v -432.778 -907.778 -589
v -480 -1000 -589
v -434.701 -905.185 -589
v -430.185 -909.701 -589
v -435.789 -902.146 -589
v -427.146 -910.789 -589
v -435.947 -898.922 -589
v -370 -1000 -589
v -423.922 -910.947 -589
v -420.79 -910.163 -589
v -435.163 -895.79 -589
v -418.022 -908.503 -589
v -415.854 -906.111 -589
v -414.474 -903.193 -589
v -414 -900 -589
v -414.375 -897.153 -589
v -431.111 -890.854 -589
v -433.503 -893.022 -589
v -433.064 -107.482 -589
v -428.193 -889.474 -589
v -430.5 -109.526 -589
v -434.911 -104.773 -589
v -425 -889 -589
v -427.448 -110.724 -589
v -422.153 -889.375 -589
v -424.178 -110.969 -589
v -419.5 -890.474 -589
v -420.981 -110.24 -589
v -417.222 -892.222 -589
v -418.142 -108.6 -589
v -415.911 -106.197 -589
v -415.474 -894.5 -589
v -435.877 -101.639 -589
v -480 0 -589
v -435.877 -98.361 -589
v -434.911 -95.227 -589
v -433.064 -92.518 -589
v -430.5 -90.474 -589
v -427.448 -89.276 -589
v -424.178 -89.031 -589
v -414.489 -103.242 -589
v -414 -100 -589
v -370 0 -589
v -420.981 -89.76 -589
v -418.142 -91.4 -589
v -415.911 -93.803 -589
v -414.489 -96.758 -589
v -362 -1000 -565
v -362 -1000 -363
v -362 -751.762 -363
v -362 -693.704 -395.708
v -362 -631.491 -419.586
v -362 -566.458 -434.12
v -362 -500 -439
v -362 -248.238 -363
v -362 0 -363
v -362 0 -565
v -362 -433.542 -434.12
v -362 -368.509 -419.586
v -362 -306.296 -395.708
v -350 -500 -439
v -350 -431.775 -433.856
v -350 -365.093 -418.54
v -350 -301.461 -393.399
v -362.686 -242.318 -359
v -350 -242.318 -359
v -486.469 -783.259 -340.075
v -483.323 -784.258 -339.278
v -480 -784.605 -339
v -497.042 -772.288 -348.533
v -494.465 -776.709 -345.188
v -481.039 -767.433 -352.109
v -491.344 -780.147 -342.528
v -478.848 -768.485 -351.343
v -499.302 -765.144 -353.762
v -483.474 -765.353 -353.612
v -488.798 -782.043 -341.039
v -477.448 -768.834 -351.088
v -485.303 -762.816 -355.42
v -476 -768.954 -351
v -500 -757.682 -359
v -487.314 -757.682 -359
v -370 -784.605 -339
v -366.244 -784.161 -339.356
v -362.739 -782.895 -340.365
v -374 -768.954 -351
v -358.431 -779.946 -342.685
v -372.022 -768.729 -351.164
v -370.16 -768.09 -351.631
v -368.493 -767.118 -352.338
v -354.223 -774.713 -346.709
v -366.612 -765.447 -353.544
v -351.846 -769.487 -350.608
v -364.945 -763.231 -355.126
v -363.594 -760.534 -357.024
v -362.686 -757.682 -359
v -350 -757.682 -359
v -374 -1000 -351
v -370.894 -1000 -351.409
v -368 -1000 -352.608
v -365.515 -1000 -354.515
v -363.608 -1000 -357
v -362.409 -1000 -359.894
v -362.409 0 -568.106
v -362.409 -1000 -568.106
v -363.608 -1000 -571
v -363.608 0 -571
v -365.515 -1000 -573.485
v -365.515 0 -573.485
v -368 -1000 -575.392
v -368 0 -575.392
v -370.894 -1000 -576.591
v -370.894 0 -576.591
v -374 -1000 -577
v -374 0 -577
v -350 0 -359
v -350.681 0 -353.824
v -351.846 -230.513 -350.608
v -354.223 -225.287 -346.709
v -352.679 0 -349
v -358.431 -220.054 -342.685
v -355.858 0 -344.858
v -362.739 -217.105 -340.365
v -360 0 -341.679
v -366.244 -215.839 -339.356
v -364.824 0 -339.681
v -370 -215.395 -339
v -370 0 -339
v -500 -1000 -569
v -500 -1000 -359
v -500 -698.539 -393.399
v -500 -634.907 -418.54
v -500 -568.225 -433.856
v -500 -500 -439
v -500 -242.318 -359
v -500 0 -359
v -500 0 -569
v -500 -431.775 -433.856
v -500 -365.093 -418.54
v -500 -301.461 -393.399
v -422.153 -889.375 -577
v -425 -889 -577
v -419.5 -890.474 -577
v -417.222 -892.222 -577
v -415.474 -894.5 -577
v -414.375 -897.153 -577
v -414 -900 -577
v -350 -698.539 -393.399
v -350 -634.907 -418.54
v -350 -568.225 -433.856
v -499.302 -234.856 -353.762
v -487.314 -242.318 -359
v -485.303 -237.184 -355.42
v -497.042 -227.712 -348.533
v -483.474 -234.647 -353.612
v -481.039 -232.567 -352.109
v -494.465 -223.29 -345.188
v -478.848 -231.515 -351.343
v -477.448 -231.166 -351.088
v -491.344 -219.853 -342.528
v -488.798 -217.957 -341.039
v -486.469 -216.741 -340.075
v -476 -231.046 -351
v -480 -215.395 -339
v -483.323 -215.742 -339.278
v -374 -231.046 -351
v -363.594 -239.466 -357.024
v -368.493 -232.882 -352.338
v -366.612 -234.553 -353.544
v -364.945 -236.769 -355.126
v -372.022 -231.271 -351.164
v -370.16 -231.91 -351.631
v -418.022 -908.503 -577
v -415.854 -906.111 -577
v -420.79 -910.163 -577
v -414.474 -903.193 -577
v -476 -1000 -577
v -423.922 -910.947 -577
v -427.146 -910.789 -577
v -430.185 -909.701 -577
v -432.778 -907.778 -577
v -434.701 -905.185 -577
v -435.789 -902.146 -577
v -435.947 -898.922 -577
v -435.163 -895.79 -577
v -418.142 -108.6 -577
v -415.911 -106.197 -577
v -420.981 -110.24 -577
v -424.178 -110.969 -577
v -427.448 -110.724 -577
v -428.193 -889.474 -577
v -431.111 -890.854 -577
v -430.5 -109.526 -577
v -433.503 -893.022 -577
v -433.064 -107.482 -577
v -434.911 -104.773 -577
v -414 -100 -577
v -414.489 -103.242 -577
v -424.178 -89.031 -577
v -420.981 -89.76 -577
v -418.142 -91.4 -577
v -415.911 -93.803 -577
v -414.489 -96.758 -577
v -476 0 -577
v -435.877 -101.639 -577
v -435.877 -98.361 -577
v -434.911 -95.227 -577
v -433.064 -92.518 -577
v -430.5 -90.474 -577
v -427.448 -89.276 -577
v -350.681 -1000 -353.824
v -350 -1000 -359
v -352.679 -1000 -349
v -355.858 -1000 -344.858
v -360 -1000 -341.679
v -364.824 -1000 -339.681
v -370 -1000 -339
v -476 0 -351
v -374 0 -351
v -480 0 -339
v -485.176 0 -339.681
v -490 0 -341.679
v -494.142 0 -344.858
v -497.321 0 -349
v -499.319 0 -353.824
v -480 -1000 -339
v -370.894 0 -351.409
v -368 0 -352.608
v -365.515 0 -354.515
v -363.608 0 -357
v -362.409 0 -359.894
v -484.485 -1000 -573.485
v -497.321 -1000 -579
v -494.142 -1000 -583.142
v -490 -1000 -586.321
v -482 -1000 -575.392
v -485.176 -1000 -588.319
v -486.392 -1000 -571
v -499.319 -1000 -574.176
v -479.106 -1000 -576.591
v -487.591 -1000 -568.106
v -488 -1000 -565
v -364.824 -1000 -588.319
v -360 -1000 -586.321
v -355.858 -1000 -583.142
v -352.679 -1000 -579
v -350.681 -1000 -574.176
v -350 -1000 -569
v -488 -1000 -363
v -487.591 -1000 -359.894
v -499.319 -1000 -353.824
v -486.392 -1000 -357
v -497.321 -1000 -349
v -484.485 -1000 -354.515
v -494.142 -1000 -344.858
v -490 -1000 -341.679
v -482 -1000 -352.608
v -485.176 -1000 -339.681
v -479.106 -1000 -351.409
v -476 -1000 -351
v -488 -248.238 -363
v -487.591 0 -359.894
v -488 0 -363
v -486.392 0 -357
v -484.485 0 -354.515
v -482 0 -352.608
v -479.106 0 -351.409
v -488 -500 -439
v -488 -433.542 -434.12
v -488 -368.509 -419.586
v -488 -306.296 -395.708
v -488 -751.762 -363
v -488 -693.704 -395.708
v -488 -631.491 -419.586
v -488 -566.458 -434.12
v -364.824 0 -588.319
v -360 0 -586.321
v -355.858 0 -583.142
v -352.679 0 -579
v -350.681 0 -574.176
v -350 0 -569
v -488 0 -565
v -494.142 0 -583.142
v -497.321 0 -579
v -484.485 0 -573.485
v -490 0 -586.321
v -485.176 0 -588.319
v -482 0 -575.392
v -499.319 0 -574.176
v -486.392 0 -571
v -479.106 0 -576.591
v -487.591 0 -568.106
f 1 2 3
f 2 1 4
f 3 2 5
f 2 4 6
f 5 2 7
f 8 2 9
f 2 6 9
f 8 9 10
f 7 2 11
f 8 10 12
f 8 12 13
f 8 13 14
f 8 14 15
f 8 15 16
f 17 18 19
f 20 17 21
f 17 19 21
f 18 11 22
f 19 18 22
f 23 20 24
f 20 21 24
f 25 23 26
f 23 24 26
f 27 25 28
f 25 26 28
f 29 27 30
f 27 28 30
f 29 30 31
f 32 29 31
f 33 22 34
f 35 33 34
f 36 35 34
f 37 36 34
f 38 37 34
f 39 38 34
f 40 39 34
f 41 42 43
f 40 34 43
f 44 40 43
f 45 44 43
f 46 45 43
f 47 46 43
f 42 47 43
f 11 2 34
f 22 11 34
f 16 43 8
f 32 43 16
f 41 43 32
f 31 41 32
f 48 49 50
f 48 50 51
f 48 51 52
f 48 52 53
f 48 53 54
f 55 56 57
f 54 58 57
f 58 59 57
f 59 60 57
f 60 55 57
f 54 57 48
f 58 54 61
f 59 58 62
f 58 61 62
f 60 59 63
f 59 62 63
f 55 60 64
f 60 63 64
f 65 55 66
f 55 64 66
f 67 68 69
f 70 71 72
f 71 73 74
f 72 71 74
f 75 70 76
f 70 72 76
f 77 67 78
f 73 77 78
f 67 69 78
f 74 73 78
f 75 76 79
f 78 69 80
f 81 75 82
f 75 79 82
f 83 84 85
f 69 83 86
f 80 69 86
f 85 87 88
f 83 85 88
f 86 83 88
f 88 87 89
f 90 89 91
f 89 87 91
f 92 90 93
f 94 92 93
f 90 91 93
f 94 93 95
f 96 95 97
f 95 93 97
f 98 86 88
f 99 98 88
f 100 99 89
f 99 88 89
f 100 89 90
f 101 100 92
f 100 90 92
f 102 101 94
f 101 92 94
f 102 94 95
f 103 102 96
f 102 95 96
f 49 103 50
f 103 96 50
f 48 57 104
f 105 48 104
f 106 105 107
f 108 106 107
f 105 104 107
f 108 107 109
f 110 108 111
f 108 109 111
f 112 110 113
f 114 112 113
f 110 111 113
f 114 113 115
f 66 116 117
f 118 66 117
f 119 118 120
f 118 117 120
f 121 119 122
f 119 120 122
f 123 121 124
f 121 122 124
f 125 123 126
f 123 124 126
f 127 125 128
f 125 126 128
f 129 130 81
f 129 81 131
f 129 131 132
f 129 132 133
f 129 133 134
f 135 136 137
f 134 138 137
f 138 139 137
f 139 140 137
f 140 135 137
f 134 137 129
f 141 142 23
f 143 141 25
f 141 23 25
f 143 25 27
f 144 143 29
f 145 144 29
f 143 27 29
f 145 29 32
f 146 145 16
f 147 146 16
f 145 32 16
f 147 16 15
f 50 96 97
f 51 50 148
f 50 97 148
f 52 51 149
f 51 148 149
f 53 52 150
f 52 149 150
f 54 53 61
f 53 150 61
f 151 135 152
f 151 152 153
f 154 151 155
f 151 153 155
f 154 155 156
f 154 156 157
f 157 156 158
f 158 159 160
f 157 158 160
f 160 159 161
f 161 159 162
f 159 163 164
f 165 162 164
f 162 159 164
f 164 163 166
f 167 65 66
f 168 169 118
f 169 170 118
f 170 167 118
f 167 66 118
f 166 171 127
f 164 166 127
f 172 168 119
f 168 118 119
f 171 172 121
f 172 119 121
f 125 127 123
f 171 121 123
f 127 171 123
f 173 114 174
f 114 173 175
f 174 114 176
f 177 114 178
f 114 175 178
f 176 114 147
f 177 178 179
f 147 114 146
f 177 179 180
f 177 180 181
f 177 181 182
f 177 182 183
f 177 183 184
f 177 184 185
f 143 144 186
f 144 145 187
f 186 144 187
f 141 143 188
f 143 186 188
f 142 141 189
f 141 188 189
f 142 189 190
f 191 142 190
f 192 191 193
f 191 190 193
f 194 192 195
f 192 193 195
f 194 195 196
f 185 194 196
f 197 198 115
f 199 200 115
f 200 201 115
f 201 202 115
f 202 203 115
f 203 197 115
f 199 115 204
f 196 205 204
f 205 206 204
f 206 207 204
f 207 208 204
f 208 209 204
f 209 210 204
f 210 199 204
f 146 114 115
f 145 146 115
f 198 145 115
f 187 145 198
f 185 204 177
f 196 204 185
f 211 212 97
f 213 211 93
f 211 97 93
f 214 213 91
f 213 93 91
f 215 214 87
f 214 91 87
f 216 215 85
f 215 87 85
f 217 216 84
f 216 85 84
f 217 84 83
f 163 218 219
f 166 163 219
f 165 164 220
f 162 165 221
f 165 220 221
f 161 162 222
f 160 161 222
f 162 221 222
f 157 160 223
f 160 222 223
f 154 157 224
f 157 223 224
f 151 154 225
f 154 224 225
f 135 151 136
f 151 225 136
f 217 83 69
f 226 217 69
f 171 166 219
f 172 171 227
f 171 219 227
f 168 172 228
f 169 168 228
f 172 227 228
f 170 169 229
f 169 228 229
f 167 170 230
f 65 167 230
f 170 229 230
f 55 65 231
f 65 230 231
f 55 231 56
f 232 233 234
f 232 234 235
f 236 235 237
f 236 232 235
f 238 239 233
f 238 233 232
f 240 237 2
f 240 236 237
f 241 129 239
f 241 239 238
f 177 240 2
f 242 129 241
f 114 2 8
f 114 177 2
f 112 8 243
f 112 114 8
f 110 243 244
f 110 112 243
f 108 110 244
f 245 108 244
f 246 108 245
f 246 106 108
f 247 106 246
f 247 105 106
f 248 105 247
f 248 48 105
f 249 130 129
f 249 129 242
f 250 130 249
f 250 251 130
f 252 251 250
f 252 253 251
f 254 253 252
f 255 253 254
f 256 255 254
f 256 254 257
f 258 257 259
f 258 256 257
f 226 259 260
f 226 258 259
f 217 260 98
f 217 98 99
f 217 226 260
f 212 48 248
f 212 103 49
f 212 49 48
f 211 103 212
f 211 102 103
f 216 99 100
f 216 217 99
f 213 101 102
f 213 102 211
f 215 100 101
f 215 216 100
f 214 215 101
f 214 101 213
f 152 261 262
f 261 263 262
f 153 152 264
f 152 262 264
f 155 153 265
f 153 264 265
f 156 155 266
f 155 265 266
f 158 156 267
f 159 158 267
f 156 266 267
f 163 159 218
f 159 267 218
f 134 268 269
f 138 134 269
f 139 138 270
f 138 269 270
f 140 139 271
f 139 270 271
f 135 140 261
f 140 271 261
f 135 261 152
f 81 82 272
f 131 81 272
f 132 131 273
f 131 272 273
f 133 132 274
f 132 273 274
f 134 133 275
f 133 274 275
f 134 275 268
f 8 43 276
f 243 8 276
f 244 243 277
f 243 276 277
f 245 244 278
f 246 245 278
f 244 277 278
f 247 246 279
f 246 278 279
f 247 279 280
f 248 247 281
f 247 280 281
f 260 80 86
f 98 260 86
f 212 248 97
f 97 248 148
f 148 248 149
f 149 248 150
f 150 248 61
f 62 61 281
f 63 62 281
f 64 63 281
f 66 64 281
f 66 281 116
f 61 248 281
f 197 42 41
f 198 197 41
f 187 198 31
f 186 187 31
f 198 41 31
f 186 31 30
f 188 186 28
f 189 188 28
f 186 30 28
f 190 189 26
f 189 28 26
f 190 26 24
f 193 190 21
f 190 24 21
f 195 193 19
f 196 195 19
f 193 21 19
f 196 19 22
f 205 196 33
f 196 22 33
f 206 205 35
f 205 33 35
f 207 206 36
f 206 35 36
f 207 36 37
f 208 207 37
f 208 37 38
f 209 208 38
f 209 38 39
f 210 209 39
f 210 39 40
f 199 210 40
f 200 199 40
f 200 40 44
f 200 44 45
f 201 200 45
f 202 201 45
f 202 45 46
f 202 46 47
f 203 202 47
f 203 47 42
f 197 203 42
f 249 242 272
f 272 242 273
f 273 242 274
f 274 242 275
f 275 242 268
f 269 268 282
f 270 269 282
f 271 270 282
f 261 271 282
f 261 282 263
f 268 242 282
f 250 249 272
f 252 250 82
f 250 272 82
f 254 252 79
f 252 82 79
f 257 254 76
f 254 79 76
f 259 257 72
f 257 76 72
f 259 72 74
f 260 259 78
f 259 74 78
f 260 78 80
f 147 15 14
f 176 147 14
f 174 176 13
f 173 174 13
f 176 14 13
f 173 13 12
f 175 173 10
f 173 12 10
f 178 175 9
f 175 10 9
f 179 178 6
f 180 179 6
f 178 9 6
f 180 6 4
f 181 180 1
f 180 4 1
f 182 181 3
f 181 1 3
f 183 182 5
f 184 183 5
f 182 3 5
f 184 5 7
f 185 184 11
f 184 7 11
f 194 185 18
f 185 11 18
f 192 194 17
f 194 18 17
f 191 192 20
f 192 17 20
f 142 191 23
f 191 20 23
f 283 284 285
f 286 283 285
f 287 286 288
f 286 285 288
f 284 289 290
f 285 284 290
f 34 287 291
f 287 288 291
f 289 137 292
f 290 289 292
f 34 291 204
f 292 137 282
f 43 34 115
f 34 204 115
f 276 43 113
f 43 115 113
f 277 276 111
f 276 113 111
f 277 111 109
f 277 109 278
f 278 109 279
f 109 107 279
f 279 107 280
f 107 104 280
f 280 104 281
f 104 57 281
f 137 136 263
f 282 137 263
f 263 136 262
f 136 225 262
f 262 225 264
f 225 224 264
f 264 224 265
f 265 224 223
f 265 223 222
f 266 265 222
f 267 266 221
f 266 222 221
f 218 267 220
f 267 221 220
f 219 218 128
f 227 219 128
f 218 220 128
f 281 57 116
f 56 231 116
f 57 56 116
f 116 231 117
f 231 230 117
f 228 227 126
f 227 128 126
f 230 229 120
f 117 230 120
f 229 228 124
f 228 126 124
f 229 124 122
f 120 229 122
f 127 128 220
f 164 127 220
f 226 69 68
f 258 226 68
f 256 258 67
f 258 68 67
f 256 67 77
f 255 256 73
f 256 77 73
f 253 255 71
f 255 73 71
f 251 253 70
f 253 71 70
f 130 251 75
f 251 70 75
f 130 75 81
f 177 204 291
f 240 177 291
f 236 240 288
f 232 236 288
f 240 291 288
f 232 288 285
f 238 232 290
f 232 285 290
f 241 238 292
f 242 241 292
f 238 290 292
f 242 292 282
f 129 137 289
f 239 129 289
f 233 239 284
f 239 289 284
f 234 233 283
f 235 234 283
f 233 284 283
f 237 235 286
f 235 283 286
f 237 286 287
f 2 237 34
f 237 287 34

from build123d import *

# Parameters (mm, degrees)
F1_DEPTH = 1000
F2_R     = 11
F3_DEPTH = 25
F5_DEPTH = 345


with BuildPart() as f1:
    # F0 (on Front) → F1 (new body)
    with BuildSketch(Plane.XZ):
        with BuildLine():
            ThreePointArc((-500, -568.999999), (-494.142136, -583.142134), (-480, -588.999999))
            Line((-480, -588.999999), (-370, -588.999999))
            ThreePointArc((-370, -588.999999), (-355.857864, -583.142134), (-350, -568.999999))
            Line((-350, -568.999999), (-350, -358.999999))
            ThreePointArc((-350, -358.999999), (-355.857864, -344.857863), (-370, -338.999999))
            Line((-370, -338.999999), (-480, -338.999999))
            ThreePointArc((-480, -338.999999), (-494.142136, -344.857863), (-500, -358.999999))
            Line((-500, -358.999999), (-500, -568.999999))
        make_face()
        with BuildLine():
            ThreePointArc((-488, -362.999999), (-484.485281, -354.514717), (-476, -350.999999))
            Line((-476, -350.999999), (-374, -350.999999))
            ThreePointArc((-374, -350.999999), (-365.514719, -354.514717), (-362, -362.999999))
            Line((-362, -362.999999), (-362, -564.999999))
            ThreePointArc((-362, -564.999999), (-365.514719, -573.48528), (-374, -576.999999))
            Line((-374, -576.999999), (-476, -576.999999))
            ThreePointArc((-476, -576.999999), (-484.485281, -573.48528), (-488, -564.999999))
            Line((-488, -564.999999), (-488, -362.999999))
        make_face(mode=Mode.SUBTRACT)
    extrude(amount=F1_DEPTH)

    # F2 (on face) → F3 (cut)
    with BuildSketch(Plane(origin=(0, 0, -588.999999), x_dir=(1, 0, 0), z_dir=(0, 0, -1))):
        with BuildLine():
            ThreePointArc((-425, 889), (-417.221825, 892.221825), (-414, 900))
            ThreePointArc((-414, 900), (-432.778175, 907.778175), (-425, 889))
        make_face()
        with Locations((-425, 100)):
            Circle(F2_R)
    extrude(amount=-F3_DEPTH, mode=Mode.SUBTRACT)

    # F4 (on face) → F5 (cut)
    with BuildSketch(Plane.YZ.offset(-350)):
        with BuildLine():
            ThreePointArc((-500, -438.999999), (-365.092624, -418.539985), (-242.318025, -358.999999))
            Line((-242.318025, -358.999999), (-500, -358.999999))
            Line((-500, -358.999999), (-500, -438.999999))
        make_face()
        with BuildLine():
            Line((-500, -358.999999), (-242.318025, -358.999999))
            ThreePointArc((-242.318025, -358.999999), (-228.672176, -349.24815), (-215.395011, -338.999999))
            Line((-215.395011, -338.999999), (-500, -338.999999))
            Line((-500, -338.999999), (-500, -358.999999))
        make_face()
        with BuildLine():
            Line((-500, -438.999999), (-500, -358.999999))
            Line((-500, -358.999999), (-757.681975, -358.999999))
            ThreePointArc((-757.681975, -358.999999), (-634.907376, -418.539985), (-500, -438.999999))
        make_face()
        with BuildLine():
            Line((-757.681975, -358.999999), (-500, -358.999999))
            Line((-500, -358.999999), (-500, -338.999999))
            Line((-500, -338.999999), (-784.604989, -338.999999))
            ThreePointArc((-784.604989, -338.999999), (-771.327824, -349.24815), (-757.681975, -358.999999))
        make_face()
        with BuildLine():
            Line((-500, -338.999999), (-215.395011, -338.999999))
            ThreePointArc((-215.395011, -338.999999), (-89.80476, -180.887949), (-45, 16.000001))
            ThreePointArc((-45, 16.000001), (-696.88795, 426.195241), (-784.604989, -338.999999))
            Line((-784.604989, -338.999999), (-500, -338.999999))
        make_face()
    extrude(amount=-F5_DEPTH, mode=Mode.SUBTRACT)


solid = f1.part
